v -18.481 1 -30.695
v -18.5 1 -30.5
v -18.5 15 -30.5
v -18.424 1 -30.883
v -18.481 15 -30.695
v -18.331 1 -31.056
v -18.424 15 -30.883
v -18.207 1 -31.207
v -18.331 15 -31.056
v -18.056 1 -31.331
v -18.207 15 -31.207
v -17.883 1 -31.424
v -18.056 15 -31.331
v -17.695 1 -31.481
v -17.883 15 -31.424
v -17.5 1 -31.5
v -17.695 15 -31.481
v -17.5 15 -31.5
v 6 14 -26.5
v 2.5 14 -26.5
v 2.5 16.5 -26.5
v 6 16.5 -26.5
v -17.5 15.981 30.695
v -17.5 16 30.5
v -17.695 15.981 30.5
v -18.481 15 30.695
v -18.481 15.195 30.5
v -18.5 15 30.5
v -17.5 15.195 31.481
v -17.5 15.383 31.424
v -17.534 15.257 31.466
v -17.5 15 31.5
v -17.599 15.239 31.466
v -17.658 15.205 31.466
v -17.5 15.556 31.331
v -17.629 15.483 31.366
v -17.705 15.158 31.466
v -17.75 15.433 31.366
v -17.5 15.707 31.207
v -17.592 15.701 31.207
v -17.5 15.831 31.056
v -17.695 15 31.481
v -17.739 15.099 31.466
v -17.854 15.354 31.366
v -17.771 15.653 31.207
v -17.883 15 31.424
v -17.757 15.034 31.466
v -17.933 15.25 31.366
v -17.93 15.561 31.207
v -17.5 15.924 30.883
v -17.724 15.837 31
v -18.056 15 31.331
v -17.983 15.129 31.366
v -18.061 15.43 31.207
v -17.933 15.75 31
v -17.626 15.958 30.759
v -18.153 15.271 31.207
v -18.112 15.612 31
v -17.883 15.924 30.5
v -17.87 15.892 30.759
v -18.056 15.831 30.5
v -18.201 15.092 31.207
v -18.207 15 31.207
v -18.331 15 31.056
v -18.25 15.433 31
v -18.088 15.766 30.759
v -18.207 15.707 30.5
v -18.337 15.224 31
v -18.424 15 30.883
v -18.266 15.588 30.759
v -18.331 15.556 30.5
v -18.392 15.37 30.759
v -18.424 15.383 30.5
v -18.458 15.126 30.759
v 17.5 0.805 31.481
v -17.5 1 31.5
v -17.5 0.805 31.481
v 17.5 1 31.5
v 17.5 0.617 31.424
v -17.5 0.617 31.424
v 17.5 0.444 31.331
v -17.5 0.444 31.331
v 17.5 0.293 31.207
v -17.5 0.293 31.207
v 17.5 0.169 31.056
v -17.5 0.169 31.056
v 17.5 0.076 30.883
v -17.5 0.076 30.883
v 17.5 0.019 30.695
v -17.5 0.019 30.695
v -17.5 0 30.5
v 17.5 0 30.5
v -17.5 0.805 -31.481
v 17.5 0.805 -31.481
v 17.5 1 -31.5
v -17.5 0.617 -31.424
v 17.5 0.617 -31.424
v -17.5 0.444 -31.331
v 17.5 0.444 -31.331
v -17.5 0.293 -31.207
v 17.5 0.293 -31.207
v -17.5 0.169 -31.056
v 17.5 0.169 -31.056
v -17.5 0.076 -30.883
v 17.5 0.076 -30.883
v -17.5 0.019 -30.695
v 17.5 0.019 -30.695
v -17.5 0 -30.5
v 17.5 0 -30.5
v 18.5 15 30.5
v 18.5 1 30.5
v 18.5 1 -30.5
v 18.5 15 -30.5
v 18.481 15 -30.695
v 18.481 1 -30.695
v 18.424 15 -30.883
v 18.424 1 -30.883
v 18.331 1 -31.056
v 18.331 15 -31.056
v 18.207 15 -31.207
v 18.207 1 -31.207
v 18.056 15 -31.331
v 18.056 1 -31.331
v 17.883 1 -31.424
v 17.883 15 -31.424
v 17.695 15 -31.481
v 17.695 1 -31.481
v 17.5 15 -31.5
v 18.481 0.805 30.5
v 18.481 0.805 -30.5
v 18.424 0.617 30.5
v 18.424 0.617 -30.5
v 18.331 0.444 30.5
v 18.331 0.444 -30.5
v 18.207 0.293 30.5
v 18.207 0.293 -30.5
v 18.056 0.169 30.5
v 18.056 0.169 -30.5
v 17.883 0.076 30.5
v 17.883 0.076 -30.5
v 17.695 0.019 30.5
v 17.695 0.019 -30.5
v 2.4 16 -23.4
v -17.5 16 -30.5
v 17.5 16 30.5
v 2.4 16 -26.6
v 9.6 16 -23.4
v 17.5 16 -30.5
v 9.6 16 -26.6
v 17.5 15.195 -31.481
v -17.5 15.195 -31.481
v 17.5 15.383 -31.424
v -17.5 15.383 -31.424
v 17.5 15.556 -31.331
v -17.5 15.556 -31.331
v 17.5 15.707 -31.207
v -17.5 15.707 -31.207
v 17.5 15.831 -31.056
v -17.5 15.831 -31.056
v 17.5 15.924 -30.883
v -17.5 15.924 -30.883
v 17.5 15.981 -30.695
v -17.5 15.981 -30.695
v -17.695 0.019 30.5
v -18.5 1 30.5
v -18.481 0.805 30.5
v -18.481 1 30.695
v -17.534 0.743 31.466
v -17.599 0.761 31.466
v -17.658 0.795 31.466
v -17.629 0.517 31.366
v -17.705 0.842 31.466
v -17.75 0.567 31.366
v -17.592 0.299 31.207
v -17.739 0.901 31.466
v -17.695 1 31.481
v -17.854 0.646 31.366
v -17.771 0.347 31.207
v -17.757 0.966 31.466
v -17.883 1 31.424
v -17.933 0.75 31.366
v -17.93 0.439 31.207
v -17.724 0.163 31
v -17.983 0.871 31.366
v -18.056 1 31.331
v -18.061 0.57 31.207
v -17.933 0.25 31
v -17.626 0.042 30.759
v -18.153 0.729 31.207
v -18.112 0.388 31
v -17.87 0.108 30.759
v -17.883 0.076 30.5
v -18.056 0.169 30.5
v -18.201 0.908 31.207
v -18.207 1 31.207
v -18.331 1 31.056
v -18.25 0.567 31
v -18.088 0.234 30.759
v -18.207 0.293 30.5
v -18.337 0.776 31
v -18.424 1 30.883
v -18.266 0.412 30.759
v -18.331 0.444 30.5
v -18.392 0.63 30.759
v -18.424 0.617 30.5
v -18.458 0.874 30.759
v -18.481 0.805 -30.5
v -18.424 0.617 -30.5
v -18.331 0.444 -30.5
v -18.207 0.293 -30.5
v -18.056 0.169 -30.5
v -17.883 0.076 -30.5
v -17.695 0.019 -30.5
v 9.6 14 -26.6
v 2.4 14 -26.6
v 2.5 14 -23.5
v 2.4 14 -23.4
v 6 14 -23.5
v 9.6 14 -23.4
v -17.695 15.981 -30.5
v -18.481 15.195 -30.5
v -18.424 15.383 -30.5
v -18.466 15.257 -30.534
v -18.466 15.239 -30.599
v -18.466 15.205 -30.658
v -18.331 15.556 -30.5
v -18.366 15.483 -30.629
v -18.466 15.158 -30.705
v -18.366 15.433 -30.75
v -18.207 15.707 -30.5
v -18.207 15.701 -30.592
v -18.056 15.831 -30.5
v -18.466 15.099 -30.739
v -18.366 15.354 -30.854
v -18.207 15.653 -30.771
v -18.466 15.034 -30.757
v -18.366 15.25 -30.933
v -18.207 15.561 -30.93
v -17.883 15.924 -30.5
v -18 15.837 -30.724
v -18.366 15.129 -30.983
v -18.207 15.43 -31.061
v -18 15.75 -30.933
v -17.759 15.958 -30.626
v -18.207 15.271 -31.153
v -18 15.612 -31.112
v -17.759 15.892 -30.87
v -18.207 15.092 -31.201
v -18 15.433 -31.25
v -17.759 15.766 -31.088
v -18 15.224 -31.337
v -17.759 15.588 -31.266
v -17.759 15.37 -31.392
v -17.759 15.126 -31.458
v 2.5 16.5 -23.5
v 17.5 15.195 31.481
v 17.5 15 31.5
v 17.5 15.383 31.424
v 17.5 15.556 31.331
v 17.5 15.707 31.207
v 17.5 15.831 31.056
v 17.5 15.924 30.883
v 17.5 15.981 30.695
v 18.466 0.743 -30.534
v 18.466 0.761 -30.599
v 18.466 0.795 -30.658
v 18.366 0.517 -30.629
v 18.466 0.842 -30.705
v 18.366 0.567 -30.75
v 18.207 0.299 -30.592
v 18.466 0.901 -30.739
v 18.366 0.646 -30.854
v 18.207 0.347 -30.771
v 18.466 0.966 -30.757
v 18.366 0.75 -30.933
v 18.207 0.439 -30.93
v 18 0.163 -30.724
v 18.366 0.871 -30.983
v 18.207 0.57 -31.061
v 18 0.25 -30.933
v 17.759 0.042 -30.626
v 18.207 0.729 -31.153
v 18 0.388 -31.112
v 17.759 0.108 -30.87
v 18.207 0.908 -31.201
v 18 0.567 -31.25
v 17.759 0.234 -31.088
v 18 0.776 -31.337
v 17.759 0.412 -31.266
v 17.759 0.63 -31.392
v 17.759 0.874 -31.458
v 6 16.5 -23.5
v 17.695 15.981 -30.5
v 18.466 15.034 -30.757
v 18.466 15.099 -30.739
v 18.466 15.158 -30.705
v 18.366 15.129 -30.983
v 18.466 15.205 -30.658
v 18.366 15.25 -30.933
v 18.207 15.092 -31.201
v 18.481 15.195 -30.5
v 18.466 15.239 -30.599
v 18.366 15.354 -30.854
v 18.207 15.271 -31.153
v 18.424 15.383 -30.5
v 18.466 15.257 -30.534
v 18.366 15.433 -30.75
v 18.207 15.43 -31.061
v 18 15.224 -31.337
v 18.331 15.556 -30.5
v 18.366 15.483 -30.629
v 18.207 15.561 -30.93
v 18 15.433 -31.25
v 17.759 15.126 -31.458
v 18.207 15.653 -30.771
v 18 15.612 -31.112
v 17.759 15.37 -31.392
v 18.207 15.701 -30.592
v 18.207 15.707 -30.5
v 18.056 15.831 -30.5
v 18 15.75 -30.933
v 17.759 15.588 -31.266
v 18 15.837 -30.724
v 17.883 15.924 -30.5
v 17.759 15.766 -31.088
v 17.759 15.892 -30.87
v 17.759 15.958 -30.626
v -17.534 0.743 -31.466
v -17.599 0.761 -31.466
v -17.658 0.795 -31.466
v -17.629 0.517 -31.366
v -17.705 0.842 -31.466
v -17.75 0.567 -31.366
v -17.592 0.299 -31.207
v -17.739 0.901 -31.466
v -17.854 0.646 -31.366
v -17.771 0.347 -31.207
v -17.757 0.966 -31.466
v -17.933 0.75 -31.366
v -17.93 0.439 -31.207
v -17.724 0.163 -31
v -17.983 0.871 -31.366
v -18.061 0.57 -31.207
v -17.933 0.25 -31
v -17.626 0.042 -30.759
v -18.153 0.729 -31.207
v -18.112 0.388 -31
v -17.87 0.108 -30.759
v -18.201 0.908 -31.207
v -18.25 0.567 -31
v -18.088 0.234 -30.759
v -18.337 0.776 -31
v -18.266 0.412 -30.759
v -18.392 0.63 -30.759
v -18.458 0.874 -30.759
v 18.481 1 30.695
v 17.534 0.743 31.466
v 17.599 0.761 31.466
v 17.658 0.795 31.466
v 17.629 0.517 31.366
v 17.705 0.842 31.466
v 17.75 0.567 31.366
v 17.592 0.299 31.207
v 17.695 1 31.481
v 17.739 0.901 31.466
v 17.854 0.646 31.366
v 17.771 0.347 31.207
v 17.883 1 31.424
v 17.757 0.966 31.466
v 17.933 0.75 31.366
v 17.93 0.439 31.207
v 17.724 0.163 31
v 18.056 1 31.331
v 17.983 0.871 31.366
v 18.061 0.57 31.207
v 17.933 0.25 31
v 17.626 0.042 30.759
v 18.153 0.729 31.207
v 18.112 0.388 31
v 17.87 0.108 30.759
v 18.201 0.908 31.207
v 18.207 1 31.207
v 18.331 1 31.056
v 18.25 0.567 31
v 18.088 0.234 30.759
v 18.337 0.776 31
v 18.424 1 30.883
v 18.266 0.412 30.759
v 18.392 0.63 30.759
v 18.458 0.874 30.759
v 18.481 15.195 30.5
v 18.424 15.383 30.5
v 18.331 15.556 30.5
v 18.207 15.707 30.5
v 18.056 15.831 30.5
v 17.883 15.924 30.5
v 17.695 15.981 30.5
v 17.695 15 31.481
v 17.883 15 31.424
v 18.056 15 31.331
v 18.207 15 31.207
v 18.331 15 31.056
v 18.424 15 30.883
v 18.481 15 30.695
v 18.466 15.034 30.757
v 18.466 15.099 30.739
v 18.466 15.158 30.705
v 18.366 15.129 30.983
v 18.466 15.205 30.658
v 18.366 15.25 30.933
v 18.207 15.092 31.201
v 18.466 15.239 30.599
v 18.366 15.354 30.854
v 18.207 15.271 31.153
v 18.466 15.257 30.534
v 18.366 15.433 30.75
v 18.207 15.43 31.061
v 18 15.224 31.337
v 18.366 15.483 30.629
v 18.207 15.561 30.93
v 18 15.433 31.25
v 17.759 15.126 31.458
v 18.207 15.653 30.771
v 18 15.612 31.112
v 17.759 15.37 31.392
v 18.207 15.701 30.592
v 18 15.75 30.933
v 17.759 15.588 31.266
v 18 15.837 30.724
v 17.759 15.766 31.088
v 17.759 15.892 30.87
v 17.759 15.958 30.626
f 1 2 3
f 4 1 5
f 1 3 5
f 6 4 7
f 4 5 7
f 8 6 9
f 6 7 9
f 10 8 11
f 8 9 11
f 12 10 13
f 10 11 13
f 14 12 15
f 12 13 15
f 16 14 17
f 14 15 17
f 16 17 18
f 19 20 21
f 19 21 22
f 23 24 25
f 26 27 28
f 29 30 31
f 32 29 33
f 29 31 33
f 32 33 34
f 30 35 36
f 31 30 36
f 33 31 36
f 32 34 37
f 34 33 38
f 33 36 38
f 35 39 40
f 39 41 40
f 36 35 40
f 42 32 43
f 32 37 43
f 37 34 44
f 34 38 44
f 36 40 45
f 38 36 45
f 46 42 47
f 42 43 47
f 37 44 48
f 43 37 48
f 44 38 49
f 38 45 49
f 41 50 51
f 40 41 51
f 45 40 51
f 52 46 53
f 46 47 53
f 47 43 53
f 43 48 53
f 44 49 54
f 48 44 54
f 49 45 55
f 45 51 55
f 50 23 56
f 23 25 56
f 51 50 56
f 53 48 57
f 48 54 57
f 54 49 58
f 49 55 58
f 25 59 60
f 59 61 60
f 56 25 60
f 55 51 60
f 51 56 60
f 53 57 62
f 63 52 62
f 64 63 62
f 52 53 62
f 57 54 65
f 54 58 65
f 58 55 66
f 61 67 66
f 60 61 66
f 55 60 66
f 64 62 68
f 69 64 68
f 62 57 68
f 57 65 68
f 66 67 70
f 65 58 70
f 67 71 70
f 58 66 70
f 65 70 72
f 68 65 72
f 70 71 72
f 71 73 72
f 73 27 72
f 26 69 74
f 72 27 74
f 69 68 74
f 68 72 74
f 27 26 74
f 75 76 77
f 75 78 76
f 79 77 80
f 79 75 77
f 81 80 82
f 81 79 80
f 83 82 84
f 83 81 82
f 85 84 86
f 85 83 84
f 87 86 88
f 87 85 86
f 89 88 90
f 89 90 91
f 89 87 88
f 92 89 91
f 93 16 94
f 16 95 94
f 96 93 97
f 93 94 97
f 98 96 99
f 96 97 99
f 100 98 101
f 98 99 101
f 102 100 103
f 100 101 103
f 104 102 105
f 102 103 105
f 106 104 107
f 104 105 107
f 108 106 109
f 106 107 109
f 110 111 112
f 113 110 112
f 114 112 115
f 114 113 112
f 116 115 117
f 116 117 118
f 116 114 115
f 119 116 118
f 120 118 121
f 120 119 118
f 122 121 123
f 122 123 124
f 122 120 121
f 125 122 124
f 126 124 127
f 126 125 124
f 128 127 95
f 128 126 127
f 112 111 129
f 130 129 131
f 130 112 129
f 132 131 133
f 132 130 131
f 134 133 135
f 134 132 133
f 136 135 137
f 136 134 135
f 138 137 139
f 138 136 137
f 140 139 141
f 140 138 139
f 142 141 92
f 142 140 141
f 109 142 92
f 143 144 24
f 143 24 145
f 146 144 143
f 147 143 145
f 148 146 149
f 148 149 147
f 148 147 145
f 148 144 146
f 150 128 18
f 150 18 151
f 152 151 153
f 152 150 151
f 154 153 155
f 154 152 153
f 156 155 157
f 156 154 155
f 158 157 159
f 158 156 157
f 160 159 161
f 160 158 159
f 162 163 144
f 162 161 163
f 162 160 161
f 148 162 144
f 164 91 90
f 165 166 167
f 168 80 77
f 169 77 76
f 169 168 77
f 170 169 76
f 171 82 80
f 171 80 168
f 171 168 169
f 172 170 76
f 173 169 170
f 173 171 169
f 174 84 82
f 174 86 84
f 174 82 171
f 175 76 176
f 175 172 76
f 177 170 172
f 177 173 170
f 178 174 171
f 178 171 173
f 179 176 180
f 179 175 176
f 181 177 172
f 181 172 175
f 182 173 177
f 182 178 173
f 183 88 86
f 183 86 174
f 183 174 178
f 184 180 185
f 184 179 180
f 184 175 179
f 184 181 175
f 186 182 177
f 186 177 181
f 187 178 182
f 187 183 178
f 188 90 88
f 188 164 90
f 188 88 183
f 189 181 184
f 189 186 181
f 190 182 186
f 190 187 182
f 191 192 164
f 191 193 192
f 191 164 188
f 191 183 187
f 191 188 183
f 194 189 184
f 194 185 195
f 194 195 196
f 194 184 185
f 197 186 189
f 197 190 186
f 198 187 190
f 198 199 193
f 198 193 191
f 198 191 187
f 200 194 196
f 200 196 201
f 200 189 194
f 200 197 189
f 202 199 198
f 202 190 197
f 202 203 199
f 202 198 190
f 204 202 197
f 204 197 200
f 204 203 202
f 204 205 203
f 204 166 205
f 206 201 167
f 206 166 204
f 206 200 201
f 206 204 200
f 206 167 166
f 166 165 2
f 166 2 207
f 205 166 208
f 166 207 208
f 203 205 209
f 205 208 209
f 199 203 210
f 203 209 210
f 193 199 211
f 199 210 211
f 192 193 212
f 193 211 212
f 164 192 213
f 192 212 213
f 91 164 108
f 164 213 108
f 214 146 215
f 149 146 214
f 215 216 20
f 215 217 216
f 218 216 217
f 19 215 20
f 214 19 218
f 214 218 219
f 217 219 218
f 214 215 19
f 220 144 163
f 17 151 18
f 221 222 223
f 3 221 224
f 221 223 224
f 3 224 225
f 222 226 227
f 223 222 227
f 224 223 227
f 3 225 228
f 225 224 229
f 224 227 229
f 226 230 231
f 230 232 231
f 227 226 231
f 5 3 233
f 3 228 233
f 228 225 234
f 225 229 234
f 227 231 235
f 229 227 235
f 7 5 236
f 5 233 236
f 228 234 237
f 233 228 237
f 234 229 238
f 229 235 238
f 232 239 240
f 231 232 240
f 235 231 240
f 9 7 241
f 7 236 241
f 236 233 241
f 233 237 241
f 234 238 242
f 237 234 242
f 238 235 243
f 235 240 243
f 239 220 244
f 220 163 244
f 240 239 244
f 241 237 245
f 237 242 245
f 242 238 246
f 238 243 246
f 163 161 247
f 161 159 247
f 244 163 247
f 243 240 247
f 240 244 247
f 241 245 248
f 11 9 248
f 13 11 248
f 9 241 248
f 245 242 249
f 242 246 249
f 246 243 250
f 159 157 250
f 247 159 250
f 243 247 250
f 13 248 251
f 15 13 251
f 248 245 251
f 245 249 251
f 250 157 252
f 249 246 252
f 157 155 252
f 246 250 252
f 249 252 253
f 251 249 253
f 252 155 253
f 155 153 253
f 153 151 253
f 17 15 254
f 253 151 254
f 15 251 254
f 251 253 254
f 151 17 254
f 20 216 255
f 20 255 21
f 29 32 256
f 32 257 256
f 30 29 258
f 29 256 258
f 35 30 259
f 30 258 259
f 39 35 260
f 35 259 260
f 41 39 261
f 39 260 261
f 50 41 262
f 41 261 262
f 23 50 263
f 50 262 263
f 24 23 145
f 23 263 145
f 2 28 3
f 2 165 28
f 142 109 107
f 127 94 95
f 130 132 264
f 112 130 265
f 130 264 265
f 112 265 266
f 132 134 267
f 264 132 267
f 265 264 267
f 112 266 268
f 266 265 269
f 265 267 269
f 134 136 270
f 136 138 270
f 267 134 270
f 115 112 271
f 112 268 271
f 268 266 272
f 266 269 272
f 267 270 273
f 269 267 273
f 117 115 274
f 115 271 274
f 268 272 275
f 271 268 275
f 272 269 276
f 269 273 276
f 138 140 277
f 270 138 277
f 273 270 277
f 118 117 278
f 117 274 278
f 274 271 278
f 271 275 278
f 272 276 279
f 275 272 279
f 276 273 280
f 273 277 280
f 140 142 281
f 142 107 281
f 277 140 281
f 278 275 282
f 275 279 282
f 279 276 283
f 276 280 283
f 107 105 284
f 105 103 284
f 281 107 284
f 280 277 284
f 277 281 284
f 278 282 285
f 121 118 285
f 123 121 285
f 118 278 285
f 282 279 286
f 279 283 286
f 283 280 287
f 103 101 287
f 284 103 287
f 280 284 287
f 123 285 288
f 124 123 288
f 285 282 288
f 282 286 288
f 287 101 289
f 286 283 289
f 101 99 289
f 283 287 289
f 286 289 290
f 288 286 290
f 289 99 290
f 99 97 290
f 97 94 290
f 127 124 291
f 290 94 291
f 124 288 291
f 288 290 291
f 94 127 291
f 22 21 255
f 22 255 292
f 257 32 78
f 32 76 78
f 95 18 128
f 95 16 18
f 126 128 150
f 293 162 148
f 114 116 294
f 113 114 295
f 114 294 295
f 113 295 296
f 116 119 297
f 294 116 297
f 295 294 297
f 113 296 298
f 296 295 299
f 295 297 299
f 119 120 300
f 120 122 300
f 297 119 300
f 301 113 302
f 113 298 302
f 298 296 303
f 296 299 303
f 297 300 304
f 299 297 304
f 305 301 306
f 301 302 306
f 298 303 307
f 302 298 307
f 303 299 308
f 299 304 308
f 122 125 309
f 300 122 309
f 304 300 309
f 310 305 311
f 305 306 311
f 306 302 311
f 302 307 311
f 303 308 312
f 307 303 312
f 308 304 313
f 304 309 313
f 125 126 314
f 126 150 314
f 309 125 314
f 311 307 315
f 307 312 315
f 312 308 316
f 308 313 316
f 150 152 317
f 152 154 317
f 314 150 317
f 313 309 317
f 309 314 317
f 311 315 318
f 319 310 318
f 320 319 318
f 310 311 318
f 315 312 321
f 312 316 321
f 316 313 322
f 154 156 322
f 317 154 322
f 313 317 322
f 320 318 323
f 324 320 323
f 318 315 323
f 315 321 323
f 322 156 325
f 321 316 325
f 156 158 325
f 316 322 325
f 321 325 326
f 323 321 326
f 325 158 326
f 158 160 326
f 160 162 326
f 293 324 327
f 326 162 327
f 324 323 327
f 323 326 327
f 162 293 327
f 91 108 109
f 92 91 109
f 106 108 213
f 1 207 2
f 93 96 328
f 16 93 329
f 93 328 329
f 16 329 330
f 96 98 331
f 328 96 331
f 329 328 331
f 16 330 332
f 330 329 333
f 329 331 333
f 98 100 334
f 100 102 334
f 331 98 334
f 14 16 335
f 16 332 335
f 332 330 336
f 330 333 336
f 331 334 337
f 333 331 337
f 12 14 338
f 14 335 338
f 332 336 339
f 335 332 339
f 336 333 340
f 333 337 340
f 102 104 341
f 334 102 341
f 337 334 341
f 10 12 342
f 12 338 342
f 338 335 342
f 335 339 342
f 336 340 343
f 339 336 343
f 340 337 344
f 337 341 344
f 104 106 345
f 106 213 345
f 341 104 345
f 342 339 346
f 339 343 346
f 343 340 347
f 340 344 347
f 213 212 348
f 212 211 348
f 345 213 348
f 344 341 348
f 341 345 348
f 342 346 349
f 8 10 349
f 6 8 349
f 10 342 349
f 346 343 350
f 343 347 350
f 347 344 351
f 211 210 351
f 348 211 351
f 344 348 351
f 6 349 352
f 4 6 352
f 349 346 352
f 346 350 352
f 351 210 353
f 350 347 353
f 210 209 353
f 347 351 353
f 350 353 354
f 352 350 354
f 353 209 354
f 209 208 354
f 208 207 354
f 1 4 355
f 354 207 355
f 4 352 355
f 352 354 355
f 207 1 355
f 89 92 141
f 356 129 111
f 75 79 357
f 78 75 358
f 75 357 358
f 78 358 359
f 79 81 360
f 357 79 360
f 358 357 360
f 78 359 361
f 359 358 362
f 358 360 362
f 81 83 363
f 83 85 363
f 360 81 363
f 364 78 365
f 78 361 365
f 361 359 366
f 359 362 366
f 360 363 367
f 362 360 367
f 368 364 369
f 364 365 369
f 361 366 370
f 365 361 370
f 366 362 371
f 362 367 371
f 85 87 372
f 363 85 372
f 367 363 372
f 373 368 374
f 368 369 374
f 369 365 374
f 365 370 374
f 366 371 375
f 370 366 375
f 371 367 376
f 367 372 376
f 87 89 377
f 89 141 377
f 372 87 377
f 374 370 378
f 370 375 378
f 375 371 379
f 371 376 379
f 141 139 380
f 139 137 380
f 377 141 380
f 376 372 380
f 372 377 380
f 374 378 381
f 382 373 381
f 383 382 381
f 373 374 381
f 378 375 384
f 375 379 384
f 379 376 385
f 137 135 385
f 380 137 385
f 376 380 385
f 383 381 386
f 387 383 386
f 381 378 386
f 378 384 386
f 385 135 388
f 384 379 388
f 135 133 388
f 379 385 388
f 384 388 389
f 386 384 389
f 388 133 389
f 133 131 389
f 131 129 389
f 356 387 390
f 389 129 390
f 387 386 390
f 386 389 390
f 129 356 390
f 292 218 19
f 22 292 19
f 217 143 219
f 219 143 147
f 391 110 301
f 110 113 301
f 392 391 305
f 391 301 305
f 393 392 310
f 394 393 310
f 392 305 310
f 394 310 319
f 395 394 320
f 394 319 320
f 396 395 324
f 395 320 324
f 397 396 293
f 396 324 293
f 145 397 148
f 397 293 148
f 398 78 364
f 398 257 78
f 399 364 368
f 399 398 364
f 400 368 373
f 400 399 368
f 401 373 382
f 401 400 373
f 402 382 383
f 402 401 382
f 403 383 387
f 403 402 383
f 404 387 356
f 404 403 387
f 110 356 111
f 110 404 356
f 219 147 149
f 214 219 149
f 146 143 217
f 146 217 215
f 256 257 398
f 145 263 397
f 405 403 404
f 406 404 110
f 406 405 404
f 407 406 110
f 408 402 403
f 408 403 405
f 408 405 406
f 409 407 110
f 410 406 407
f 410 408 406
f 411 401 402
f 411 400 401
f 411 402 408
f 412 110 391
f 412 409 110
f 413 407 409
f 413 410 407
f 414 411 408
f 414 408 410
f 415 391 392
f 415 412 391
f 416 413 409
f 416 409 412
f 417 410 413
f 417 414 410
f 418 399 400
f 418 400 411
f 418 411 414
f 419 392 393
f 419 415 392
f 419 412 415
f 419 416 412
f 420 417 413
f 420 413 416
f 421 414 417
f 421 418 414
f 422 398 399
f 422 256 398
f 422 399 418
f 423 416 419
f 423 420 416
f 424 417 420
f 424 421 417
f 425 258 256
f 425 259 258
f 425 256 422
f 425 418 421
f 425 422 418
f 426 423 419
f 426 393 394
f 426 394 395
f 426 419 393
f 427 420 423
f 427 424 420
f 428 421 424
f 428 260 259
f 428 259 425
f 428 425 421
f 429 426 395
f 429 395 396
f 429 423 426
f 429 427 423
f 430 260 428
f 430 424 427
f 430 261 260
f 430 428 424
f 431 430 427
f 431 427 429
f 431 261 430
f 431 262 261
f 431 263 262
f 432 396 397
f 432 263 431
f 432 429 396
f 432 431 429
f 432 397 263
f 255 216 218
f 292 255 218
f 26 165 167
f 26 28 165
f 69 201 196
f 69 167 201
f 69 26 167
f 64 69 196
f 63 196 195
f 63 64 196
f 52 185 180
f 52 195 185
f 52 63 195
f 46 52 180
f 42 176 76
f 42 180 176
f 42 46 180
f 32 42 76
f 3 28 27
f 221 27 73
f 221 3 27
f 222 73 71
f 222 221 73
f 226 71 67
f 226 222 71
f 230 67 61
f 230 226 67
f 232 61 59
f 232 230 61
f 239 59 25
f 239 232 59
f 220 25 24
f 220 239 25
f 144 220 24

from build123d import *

# Parameters (mm, degrees)
SKETCH_1_W          = 37
SKETCH_1_H          = 63
EXTRUDE_1_DEPTH     = 16
FILLET_1_R          = 1
CUT_EXTRUDE_START   = 16
SKETCH_1_9_W        = 7.2
SKETCH_1_9_H        = 3.2
CUT_EXTRUDE_1_DEPTH = 2
EXTRUDE_START       = 14
SKETCH_1_10_W       = 3.5
SKETCH_1_10_H       = 3
EXTRUDE_2_DEPTH     = 2.5


with BuildPart() as part:
    # 草图1 → 凸台-拉伸1 (new body)
    with BuildSketch(Plane(origin=(0, 0, 0), x_dir=(1, 0, 0), z_dir=(0, 1, 0))):
        Rectangle(SKETCH_1_W, SKETCH_1_H)
    extrude(amount=EXTRUDE_1_DEPTH)

    # 圆角1
    fillet_1_edges = [part.edges().sort_by_distance(p)[0] for p in [
        (0, 16, -31.5),
        (-18.5, 16, 0),
        (0, 16, 31.5),
        (-18.5, 0, 0),
        (0, 0, -31.5),
        (18.5, 0, 0),
        (0, 0, 31.5),
        (-18.5, 8, 31.5),
        (-18.5, 8, -31.5),
        (18.5, 8, -31.5),
        (18.5, 8, 31.5),
        (18.5, 16, 0),
    ]]
    fillet(fillet_1_edges, radius=FILLET_1_R)

    # 草图1<9> → 切除-拉伸1 (cut)
    with BuildSketch(Plane(origin=(0, 0, 0), x_dir=(1, 0, 0), z_dir=(0, 1, 0)).offset(CUT_EXTRUDE_START)):
        with Locations((6, 25)):
            Rectangle(SKETCH_1_9_W, SKETCH_1_9_H)
    extrude(amount=-CUT_EXTRUDE_1_DEPTH, mode=Mode.SUBTRACT)

    # 草图1<10> → 凸台-拉伸2 (add)
    with BuildSketch(Plane(origin=(0, 0, 0), x_dir=(1, 0, 0), z_dir=(0, 1, 0)).offset(EXTRUDE_START)):
        with Locations((4.25, 25)):
            Rectangle(SKETCH_1_10_W, SKETCH_1_10_H)
    extrude(amount=EXTRUDE_2_DEPTH)


solid = part.part
